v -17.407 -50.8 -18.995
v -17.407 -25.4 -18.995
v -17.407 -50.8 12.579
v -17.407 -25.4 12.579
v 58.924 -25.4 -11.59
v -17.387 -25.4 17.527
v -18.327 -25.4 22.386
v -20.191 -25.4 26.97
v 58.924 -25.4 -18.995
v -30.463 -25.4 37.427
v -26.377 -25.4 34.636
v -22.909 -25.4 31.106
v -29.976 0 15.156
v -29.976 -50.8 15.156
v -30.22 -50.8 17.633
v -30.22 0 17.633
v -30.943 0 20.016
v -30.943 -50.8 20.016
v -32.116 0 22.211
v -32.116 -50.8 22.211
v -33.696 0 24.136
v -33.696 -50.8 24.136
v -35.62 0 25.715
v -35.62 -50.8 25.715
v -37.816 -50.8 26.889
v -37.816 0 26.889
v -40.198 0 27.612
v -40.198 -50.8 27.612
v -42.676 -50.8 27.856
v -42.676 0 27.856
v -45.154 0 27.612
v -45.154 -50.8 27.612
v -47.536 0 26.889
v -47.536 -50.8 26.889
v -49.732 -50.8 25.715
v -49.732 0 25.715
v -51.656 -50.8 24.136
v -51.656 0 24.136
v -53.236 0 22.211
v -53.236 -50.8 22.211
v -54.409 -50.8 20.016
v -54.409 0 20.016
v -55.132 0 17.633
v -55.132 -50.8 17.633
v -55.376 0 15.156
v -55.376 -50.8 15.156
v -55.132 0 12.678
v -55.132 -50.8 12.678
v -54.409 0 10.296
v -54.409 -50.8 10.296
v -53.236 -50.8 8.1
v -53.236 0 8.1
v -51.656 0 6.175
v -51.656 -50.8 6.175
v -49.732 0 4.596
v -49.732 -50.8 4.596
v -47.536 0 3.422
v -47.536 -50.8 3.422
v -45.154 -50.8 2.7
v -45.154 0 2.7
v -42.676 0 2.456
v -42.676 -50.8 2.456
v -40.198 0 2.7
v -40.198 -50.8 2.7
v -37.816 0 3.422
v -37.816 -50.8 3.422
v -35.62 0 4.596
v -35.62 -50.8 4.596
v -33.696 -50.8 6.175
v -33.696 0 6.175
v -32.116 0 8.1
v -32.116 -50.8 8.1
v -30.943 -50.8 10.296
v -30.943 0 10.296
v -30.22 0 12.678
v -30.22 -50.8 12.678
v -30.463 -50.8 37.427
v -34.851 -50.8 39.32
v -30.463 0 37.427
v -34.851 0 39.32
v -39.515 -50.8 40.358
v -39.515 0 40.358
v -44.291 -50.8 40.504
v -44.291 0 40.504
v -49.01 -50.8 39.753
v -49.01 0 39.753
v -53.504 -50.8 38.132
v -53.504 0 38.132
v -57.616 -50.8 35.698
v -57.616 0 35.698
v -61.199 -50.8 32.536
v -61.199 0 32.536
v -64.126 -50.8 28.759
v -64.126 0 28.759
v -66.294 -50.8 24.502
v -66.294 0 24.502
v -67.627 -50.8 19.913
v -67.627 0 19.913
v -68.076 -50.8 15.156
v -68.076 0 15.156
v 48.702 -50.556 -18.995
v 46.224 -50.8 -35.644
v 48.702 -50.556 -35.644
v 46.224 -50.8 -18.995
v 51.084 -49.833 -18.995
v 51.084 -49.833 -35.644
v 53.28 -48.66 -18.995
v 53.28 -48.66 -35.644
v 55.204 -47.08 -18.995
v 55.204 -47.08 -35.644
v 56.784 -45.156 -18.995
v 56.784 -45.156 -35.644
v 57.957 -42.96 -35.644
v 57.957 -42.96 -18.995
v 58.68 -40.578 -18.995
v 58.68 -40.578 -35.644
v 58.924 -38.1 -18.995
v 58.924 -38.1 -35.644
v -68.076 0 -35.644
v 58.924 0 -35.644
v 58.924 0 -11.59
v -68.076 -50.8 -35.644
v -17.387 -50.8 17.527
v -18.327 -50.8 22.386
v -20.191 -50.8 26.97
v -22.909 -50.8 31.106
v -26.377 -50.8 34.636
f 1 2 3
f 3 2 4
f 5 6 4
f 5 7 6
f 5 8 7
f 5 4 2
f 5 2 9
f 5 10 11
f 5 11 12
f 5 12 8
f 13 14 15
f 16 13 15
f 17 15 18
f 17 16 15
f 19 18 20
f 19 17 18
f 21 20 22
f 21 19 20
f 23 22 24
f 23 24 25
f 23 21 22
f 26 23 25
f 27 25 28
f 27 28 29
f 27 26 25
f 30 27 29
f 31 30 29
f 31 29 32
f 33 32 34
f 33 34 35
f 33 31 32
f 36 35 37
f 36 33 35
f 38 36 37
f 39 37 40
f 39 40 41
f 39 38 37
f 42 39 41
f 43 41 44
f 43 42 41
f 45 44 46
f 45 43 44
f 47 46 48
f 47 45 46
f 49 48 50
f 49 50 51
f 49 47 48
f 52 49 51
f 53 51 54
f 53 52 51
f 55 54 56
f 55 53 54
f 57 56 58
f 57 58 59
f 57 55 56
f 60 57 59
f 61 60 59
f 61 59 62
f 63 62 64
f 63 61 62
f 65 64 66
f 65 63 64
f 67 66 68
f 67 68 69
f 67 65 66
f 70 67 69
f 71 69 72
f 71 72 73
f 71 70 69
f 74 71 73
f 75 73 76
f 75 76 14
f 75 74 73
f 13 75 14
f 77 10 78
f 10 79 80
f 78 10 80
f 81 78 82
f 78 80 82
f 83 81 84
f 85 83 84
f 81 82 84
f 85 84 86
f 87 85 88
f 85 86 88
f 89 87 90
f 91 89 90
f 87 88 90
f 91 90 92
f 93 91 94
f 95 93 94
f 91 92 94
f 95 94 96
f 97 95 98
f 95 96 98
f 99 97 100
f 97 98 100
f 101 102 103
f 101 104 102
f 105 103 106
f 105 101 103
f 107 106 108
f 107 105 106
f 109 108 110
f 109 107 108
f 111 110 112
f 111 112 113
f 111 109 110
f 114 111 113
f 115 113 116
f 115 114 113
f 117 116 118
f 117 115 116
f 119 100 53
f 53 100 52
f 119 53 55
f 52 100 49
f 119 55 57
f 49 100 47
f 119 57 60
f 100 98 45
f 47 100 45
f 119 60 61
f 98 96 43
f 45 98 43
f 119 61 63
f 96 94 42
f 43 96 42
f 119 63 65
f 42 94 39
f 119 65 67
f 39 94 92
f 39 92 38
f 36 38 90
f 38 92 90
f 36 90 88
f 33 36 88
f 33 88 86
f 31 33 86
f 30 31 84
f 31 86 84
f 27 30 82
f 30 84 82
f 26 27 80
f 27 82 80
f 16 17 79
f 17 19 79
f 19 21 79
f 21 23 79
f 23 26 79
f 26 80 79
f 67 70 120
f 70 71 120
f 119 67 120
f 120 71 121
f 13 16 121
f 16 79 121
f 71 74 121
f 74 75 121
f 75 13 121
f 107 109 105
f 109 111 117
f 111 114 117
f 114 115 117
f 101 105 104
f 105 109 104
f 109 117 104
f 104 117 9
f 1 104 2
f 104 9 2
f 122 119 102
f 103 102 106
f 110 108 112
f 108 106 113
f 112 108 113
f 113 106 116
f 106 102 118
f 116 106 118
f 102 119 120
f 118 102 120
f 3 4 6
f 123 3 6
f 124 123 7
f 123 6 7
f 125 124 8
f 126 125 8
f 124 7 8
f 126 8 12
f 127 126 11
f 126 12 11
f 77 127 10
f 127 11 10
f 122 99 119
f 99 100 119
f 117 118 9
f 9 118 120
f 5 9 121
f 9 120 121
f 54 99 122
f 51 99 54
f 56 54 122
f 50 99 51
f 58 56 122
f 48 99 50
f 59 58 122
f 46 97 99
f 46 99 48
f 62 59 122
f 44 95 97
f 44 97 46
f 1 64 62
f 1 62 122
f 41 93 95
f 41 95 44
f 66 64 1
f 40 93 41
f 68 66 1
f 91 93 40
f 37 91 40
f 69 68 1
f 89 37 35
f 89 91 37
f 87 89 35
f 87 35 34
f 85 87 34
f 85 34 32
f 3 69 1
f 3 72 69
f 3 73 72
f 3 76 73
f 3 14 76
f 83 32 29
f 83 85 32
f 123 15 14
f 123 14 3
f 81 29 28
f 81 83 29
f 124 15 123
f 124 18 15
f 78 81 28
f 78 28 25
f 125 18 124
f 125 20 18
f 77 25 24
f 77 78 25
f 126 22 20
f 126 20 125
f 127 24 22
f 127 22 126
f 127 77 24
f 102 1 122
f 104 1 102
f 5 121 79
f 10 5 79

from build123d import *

# Parameters (mm, degrees)
F0_R     = 12.7
F1_DEPTH = 25.4
F4_R     = 12.7
F5_DEPTH = 25.4
F6_R     = 12.7


with BuildPart() as f1:
    # F0 (on Front) → F1 (new body)
    with BuildSketch(Plane.XZ):
        with BuildLine():
            Line((58.923879, -11.589798), (-30.463359, 37.426992))
            ThreePointArc((-30.463359, 37.426992), (-55.617447, 37.011684), (-68.076121, 15.155744))
            Line((-68.076121, 15.155744), (-68.076121, -35.644256))
            Line((-68.076121, -35.644256), (58.923879, -35.644256))
            Line((58.923879, -35.644256), (58.923879, -21.580534))
            Line((58.923879, -21.580534), (58.923879, -11.589798))
        make_face()
        with Locations((-42.676121, 15.155744)):
            Circle(F0_R, mode=Mode.SUBTRACT)
    extrude(amount=F1_DEPTH)

    # F4 (on face) → F5 (join)
    with BuildSketch(Plane.XZ.offset(25.4)):
        with BuildLine():
            Line((-17.407208, -18.995201), (-17.407208, 12.578534))
            ThreePointArc((-17.407208, 12.578534), (-20.191005, 26.970123), (-30.463359, 37.426992))
            ThreePointArc((-30.463359, 37.426992), (-55.617447, 37.011684), (-68.076121, 15.155744))
            Line((-68.076121, 15.155744), (-68.076121, -18.995201))
            Line((-68.076121, -18.995201), (-68.076121, -35.644256))
            Line((-68.076121, -35.644256), (58.923879, -35.644256))
            Line((58.923879, -35.644256), (58.923879, -18.995201))
            Line((58.923879, -18.995201), (-17.407208, -18.995201))
        make_face()
        with Locations((-42.676121, 15.155744)):
            Circle(F4_R, mode=Mode.SUBTRACT)
    extrude(amount=F5_DEPTH)

    # F6
    f6_edges = [f1.edges().sort_by_distance(p)[0] for p in [
        (58.923879, -50.8, -27.319728),
    ]]
    fillet(f6_edges, radius=F6_R)


solid = f1.part
